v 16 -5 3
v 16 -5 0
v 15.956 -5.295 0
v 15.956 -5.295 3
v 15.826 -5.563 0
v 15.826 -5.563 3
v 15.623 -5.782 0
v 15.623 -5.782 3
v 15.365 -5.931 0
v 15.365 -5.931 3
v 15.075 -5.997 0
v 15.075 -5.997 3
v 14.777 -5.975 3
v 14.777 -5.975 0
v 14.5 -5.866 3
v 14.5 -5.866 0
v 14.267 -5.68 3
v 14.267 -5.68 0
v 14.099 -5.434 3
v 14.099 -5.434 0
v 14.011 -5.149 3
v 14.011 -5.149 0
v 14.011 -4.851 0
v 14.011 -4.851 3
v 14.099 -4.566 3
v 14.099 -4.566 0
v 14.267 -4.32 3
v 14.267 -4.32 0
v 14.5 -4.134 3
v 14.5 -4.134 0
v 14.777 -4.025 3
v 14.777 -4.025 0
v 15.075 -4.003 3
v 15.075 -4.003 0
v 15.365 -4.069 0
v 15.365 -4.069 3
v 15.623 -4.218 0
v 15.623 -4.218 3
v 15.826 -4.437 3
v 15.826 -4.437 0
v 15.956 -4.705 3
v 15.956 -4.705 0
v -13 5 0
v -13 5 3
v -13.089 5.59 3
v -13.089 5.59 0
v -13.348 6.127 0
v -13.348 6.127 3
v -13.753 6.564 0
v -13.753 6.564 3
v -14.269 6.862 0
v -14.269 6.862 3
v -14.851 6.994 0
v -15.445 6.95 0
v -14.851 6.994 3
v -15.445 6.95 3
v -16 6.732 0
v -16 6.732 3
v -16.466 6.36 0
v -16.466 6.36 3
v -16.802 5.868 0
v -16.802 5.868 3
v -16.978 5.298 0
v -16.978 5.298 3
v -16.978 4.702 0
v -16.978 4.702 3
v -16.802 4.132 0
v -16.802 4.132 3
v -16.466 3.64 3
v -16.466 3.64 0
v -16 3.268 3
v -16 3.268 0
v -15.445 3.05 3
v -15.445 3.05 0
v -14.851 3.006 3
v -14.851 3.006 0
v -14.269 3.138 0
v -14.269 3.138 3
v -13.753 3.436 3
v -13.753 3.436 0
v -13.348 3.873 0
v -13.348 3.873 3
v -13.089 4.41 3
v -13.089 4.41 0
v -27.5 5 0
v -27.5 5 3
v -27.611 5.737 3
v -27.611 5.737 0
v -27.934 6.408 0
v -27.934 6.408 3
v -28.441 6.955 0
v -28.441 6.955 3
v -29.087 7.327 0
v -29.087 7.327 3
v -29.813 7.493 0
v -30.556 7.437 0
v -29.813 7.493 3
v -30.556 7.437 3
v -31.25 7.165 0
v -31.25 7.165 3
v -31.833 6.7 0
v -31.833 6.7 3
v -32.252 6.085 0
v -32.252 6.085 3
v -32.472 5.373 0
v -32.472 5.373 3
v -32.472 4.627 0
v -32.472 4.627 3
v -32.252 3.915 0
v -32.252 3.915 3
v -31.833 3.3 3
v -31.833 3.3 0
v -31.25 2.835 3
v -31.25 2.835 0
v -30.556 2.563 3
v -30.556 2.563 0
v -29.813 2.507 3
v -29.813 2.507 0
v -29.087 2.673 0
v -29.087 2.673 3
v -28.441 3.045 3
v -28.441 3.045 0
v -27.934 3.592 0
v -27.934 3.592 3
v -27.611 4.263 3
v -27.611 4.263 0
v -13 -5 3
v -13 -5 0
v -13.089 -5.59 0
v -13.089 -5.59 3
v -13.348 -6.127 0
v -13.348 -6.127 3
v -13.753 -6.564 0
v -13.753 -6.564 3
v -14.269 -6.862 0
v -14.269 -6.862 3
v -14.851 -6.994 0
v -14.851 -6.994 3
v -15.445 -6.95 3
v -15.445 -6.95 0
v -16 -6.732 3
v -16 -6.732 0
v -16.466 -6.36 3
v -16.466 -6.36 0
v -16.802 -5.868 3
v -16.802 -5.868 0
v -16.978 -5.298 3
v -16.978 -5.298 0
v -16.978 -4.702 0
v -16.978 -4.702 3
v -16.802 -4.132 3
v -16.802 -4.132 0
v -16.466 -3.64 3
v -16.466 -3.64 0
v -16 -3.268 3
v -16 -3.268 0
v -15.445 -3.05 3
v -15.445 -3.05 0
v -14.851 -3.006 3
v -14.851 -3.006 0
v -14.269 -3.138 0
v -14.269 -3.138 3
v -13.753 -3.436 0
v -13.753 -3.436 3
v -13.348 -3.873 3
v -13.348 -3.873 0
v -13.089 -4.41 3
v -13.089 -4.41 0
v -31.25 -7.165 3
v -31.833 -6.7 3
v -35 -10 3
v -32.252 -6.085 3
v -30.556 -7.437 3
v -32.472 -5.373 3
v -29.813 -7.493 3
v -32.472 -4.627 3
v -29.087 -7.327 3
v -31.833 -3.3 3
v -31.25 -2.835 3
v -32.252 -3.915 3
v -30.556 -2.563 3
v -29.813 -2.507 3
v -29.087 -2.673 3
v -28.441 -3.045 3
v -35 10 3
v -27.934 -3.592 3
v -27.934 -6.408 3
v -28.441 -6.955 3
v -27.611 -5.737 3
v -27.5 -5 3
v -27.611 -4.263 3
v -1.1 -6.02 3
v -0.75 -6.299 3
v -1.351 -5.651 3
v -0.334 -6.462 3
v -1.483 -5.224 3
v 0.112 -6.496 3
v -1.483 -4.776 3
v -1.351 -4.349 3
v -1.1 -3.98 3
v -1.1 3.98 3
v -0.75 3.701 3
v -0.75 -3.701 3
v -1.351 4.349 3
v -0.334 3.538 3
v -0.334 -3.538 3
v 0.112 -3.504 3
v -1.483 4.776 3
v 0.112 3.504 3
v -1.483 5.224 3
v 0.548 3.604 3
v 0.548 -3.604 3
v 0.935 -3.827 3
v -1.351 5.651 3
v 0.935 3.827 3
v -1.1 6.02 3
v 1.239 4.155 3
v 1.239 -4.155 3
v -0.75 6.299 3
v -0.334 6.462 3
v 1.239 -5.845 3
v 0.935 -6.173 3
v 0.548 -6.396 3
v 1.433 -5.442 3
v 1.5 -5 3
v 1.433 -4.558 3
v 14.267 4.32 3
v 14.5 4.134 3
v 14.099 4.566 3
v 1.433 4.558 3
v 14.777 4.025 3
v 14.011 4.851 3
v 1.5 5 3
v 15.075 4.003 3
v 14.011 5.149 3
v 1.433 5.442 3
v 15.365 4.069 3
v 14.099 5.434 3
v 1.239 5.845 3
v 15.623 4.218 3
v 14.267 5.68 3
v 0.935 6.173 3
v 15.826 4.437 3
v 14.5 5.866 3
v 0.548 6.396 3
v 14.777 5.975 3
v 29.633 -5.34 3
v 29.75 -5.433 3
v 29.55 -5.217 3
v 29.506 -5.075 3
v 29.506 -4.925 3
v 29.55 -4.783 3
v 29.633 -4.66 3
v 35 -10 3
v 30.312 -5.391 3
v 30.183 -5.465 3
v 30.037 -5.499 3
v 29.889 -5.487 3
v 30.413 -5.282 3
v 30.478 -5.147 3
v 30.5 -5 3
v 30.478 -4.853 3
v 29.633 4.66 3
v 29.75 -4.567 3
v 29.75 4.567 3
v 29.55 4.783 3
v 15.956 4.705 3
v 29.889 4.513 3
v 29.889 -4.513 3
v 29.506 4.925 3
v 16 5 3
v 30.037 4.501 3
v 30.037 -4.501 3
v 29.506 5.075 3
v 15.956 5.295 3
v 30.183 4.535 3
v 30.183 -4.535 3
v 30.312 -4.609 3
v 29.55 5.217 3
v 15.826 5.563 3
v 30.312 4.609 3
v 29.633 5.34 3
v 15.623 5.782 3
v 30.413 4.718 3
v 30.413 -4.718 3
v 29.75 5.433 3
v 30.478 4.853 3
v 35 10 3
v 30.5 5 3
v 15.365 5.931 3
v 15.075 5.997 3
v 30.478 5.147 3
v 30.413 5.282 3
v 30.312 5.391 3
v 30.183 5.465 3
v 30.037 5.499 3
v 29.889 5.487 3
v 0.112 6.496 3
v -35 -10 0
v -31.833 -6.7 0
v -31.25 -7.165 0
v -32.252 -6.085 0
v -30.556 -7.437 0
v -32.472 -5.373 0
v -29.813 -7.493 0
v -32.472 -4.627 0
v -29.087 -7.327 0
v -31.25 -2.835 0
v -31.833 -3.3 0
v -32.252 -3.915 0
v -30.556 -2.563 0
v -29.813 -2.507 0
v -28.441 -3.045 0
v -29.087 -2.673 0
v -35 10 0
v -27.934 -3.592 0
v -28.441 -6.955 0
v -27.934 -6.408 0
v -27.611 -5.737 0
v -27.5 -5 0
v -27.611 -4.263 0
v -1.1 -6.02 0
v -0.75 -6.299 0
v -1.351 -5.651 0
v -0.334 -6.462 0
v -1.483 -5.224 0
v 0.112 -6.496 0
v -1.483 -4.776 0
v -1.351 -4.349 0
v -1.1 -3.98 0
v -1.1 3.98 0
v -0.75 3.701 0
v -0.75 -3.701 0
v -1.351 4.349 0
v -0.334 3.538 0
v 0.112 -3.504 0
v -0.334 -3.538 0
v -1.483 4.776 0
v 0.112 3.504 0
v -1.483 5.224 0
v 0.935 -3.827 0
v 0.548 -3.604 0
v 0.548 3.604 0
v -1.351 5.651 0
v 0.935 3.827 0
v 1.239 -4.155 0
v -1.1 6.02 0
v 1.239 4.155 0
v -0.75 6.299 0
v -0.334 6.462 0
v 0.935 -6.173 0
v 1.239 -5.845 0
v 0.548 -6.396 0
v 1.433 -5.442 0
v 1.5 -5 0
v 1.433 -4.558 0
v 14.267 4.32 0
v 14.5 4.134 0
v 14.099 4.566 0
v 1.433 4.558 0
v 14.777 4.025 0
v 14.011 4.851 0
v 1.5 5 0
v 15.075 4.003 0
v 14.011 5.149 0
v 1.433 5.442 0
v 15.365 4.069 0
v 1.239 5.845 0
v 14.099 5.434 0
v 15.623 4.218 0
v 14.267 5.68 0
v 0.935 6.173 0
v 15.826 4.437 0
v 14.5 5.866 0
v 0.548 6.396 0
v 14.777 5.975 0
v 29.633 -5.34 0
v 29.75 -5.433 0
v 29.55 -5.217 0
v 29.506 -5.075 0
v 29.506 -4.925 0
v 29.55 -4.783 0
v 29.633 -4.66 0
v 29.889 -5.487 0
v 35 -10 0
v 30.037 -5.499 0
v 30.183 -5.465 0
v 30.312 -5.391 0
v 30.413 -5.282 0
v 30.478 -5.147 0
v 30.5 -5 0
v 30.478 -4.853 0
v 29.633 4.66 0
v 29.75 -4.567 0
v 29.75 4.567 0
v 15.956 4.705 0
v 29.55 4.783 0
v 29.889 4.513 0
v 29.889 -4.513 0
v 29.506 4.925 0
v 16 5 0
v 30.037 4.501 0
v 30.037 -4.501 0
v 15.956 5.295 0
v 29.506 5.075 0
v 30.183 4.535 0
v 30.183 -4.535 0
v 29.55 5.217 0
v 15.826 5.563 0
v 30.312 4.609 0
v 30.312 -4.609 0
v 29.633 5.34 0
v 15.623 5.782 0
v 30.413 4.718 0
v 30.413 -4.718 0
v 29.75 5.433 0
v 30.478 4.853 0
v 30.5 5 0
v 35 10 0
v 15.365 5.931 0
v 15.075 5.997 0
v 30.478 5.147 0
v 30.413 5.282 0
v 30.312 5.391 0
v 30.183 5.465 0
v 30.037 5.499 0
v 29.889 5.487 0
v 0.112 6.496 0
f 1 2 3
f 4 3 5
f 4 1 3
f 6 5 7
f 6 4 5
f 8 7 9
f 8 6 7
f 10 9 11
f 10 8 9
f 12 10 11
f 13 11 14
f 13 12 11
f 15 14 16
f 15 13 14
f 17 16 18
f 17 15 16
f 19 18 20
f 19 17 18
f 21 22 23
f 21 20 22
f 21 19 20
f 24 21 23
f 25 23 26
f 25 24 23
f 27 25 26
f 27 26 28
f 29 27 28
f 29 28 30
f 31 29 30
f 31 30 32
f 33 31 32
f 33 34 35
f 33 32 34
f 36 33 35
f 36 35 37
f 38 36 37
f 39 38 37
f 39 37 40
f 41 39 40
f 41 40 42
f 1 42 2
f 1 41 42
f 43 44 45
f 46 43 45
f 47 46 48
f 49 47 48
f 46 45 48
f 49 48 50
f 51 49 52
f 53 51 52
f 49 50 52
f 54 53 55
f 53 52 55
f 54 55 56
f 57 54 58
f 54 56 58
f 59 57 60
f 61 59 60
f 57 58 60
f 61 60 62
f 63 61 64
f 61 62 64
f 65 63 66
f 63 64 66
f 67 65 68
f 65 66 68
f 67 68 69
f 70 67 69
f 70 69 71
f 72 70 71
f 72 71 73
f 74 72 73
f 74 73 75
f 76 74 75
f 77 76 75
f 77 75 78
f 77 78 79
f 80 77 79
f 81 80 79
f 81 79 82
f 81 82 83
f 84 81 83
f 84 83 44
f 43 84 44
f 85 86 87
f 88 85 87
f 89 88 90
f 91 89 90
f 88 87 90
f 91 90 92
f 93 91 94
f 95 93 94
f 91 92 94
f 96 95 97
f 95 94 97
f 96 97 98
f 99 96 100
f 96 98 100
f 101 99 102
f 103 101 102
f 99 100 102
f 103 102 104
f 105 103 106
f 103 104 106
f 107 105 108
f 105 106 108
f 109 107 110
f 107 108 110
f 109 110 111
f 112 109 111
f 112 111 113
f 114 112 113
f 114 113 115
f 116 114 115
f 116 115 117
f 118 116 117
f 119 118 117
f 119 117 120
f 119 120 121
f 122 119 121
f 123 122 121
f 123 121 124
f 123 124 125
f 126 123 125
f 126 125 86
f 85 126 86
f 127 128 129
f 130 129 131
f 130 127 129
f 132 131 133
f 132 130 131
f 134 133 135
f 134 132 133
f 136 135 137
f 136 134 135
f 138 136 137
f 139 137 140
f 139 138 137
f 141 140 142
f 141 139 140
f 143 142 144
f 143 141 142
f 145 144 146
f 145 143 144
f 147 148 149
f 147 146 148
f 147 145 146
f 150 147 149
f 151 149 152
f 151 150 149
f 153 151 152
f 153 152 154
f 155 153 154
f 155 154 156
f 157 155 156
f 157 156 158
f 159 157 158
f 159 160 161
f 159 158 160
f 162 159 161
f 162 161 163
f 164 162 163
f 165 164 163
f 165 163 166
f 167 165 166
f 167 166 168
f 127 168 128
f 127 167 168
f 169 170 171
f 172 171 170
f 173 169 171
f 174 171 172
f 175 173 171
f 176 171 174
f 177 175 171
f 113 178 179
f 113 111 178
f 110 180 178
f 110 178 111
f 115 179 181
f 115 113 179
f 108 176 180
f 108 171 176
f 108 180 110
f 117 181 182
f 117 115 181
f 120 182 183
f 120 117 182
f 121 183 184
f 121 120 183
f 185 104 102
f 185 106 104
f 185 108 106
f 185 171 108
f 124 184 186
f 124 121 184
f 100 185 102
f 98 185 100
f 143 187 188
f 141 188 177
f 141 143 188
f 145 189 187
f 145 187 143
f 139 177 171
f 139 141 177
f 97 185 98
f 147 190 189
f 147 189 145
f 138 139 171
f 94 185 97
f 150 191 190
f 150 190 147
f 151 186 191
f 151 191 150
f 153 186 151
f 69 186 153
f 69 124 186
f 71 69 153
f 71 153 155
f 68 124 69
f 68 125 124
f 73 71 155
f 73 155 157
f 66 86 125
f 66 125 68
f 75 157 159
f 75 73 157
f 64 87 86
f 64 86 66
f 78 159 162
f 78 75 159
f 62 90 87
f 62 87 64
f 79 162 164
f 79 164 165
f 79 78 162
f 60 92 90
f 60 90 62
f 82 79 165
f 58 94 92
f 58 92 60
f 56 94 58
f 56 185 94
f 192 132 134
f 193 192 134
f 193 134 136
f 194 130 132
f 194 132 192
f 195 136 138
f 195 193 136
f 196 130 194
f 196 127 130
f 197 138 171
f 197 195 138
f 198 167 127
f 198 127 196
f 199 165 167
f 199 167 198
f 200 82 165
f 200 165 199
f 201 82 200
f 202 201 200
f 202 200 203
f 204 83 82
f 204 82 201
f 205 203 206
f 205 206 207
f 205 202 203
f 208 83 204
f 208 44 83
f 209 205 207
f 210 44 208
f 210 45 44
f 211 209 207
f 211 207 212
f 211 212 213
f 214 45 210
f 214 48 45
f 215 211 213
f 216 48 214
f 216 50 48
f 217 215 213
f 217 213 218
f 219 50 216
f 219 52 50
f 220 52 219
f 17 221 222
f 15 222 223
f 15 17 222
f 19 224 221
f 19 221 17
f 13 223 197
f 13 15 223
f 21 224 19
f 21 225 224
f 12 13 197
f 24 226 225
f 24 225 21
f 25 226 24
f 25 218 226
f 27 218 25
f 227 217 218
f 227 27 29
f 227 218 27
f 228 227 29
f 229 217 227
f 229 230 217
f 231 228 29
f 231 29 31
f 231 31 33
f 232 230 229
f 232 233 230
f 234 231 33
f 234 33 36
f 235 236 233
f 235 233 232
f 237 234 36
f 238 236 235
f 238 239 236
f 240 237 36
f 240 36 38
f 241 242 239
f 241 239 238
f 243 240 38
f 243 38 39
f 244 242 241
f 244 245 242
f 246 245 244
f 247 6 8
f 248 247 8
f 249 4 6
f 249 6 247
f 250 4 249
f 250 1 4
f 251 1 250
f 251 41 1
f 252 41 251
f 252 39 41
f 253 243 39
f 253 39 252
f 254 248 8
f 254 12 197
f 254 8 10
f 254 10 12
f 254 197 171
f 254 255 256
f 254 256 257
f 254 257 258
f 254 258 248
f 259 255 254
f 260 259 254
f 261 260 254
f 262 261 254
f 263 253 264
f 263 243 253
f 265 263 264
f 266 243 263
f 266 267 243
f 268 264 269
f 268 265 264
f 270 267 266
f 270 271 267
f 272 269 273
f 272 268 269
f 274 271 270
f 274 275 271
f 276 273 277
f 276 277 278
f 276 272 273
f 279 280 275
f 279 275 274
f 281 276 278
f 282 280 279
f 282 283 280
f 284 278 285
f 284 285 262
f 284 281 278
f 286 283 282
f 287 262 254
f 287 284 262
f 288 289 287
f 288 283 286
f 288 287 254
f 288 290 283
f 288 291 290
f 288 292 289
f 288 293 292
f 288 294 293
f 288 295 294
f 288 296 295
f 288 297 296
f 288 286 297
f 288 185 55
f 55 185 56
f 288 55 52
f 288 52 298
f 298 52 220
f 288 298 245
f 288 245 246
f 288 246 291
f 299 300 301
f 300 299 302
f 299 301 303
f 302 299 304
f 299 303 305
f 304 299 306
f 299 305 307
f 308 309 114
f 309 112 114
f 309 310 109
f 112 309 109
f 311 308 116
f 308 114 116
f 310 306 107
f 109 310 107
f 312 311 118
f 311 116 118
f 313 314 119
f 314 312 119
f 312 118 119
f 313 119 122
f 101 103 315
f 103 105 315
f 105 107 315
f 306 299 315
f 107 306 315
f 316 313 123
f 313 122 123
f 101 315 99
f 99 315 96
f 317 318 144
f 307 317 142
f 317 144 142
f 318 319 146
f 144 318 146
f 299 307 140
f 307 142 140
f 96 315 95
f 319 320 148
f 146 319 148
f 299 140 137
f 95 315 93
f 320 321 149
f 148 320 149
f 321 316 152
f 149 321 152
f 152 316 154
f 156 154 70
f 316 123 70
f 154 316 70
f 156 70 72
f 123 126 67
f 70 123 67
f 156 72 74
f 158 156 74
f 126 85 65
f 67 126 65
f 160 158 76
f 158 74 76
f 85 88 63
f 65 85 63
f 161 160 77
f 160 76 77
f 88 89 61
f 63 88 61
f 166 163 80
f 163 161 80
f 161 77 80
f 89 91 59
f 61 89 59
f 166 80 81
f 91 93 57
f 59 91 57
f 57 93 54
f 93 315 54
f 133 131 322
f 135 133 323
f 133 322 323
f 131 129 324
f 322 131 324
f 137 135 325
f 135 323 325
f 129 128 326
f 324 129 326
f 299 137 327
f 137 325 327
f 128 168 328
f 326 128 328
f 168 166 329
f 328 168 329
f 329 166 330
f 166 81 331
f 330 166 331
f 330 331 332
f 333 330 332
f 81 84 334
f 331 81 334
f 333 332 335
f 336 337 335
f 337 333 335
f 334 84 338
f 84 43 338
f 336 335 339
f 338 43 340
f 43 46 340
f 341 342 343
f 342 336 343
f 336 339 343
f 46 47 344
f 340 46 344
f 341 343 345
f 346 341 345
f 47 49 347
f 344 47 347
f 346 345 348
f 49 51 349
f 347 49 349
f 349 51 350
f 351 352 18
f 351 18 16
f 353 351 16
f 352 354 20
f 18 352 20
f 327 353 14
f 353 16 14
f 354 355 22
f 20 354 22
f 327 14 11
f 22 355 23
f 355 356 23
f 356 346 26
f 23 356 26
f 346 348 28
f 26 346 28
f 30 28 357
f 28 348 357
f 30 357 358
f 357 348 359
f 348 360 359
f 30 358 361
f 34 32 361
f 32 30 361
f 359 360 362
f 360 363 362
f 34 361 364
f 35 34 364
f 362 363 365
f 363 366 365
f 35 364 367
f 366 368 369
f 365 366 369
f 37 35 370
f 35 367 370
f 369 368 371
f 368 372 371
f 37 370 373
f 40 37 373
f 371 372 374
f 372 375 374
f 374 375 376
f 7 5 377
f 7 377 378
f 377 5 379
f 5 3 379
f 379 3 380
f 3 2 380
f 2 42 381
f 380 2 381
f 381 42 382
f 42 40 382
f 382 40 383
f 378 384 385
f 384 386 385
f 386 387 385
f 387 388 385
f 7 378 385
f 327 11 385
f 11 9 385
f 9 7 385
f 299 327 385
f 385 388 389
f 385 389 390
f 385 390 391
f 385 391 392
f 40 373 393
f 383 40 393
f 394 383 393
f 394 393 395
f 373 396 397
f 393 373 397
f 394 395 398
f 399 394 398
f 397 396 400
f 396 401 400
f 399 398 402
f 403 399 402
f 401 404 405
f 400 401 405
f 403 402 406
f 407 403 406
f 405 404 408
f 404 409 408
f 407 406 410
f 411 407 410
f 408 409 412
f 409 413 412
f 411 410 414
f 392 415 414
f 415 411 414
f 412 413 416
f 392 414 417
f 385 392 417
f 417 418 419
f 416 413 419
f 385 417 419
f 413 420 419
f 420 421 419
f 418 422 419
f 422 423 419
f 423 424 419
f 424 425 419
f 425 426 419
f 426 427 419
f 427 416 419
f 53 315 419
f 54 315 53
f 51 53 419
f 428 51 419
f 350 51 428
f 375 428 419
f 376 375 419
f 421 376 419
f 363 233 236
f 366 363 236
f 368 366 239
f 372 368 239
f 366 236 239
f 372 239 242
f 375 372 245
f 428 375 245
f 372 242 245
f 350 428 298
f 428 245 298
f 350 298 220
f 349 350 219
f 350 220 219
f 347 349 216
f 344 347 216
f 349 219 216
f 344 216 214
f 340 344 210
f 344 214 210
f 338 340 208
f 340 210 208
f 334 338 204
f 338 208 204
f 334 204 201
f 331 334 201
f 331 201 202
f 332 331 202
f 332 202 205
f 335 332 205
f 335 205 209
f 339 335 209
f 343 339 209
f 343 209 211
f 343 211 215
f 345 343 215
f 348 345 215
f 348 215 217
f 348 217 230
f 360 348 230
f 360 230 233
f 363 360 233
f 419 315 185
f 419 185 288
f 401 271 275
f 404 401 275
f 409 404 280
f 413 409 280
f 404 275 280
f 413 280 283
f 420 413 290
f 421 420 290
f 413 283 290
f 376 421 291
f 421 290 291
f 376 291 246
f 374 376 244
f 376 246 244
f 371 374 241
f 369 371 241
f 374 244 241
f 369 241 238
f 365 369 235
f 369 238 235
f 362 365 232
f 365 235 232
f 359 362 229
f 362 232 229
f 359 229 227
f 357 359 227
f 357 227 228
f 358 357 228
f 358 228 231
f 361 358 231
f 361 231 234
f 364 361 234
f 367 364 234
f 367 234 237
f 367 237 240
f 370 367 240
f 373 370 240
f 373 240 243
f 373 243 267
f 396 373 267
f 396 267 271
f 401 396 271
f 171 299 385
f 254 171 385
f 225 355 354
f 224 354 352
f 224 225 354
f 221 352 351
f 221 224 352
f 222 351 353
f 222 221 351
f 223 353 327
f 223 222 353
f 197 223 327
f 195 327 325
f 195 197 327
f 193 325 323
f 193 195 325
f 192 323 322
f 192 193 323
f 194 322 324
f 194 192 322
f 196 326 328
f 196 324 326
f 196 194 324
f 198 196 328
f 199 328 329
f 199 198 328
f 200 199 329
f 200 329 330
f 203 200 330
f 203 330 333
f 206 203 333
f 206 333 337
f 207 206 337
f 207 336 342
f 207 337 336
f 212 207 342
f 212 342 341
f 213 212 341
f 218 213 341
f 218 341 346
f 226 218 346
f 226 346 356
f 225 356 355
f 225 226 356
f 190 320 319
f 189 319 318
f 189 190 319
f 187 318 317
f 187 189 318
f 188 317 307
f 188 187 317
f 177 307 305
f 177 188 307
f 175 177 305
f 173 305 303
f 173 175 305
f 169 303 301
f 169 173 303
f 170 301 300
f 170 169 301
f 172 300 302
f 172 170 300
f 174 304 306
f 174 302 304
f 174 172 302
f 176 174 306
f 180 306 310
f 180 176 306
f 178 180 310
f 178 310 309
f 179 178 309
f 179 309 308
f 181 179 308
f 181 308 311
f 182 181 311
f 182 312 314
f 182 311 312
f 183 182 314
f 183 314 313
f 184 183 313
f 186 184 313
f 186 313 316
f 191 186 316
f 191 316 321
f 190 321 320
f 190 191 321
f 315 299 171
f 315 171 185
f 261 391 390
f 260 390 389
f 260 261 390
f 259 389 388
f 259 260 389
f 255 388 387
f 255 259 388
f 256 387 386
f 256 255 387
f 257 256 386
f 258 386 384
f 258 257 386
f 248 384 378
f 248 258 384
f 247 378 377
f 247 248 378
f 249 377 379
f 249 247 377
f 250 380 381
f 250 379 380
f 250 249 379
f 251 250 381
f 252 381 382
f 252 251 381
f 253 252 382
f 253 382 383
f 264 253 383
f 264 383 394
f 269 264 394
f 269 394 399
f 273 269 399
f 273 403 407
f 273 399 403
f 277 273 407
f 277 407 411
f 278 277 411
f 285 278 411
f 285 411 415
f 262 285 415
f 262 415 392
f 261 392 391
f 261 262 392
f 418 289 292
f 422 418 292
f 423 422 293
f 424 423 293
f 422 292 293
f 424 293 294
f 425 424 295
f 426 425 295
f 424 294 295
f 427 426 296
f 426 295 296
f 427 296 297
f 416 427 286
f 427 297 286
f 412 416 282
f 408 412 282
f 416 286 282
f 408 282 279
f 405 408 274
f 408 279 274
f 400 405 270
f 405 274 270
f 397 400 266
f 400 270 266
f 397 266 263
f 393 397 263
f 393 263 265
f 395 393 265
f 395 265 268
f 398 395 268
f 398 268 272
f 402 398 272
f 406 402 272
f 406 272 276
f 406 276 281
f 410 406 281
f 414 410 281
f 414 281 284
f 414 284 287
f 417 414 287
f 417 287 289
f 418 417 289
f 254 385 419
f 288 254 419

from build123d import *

# Parameters (mm, degrees)
SKETCH_W      = 70
SKETCH_H      = 20
PAD_DEPTH     = 3
SKETCH001_R   = 2.5
SKETCH001_R_2 = 2
SKETCH001_R_3 = 1.5
SKETCH001_R_4 = 1
SKETCH001_R_5 = 0.5
POCKET_DEPTH  = 148.72677


with BuildPart() as part:
    # Sketch → Pad (new body)
    with BuildSketch(Plane.XY):
        Rectangle(SKETCH_W, SKETCH_H)
    extrude(amount=PAD_DEPTH)

    # Sketch001 (on Face6 of Pad) → Pocket (cut, through all)
    with BuildSketch(Plane.XY.offset(3)):
        with Locations((-30, 5)):
            Circle(SKETCH001_R)
        with Locations((-15, 5)):
            Circle(SKETCH001_R_2)
        with Locations((0, 5)):
            Circle(SKETCH001_R_3)
        with Locations((15, 5)):
            Circle(SKETCH001_R_4)
        with Locations((30, 5)):
            Circle(SKETCH001_R_5)
    pocket = extrude(amount=-POCKET_DEPTH, mode=Mode.SUBTRACT)

    # Mirrored: Pocket across XZ
    add(pocket.mirror(Plane.XZ), mode=Mode.SUBTRACT)


solid = part.part
